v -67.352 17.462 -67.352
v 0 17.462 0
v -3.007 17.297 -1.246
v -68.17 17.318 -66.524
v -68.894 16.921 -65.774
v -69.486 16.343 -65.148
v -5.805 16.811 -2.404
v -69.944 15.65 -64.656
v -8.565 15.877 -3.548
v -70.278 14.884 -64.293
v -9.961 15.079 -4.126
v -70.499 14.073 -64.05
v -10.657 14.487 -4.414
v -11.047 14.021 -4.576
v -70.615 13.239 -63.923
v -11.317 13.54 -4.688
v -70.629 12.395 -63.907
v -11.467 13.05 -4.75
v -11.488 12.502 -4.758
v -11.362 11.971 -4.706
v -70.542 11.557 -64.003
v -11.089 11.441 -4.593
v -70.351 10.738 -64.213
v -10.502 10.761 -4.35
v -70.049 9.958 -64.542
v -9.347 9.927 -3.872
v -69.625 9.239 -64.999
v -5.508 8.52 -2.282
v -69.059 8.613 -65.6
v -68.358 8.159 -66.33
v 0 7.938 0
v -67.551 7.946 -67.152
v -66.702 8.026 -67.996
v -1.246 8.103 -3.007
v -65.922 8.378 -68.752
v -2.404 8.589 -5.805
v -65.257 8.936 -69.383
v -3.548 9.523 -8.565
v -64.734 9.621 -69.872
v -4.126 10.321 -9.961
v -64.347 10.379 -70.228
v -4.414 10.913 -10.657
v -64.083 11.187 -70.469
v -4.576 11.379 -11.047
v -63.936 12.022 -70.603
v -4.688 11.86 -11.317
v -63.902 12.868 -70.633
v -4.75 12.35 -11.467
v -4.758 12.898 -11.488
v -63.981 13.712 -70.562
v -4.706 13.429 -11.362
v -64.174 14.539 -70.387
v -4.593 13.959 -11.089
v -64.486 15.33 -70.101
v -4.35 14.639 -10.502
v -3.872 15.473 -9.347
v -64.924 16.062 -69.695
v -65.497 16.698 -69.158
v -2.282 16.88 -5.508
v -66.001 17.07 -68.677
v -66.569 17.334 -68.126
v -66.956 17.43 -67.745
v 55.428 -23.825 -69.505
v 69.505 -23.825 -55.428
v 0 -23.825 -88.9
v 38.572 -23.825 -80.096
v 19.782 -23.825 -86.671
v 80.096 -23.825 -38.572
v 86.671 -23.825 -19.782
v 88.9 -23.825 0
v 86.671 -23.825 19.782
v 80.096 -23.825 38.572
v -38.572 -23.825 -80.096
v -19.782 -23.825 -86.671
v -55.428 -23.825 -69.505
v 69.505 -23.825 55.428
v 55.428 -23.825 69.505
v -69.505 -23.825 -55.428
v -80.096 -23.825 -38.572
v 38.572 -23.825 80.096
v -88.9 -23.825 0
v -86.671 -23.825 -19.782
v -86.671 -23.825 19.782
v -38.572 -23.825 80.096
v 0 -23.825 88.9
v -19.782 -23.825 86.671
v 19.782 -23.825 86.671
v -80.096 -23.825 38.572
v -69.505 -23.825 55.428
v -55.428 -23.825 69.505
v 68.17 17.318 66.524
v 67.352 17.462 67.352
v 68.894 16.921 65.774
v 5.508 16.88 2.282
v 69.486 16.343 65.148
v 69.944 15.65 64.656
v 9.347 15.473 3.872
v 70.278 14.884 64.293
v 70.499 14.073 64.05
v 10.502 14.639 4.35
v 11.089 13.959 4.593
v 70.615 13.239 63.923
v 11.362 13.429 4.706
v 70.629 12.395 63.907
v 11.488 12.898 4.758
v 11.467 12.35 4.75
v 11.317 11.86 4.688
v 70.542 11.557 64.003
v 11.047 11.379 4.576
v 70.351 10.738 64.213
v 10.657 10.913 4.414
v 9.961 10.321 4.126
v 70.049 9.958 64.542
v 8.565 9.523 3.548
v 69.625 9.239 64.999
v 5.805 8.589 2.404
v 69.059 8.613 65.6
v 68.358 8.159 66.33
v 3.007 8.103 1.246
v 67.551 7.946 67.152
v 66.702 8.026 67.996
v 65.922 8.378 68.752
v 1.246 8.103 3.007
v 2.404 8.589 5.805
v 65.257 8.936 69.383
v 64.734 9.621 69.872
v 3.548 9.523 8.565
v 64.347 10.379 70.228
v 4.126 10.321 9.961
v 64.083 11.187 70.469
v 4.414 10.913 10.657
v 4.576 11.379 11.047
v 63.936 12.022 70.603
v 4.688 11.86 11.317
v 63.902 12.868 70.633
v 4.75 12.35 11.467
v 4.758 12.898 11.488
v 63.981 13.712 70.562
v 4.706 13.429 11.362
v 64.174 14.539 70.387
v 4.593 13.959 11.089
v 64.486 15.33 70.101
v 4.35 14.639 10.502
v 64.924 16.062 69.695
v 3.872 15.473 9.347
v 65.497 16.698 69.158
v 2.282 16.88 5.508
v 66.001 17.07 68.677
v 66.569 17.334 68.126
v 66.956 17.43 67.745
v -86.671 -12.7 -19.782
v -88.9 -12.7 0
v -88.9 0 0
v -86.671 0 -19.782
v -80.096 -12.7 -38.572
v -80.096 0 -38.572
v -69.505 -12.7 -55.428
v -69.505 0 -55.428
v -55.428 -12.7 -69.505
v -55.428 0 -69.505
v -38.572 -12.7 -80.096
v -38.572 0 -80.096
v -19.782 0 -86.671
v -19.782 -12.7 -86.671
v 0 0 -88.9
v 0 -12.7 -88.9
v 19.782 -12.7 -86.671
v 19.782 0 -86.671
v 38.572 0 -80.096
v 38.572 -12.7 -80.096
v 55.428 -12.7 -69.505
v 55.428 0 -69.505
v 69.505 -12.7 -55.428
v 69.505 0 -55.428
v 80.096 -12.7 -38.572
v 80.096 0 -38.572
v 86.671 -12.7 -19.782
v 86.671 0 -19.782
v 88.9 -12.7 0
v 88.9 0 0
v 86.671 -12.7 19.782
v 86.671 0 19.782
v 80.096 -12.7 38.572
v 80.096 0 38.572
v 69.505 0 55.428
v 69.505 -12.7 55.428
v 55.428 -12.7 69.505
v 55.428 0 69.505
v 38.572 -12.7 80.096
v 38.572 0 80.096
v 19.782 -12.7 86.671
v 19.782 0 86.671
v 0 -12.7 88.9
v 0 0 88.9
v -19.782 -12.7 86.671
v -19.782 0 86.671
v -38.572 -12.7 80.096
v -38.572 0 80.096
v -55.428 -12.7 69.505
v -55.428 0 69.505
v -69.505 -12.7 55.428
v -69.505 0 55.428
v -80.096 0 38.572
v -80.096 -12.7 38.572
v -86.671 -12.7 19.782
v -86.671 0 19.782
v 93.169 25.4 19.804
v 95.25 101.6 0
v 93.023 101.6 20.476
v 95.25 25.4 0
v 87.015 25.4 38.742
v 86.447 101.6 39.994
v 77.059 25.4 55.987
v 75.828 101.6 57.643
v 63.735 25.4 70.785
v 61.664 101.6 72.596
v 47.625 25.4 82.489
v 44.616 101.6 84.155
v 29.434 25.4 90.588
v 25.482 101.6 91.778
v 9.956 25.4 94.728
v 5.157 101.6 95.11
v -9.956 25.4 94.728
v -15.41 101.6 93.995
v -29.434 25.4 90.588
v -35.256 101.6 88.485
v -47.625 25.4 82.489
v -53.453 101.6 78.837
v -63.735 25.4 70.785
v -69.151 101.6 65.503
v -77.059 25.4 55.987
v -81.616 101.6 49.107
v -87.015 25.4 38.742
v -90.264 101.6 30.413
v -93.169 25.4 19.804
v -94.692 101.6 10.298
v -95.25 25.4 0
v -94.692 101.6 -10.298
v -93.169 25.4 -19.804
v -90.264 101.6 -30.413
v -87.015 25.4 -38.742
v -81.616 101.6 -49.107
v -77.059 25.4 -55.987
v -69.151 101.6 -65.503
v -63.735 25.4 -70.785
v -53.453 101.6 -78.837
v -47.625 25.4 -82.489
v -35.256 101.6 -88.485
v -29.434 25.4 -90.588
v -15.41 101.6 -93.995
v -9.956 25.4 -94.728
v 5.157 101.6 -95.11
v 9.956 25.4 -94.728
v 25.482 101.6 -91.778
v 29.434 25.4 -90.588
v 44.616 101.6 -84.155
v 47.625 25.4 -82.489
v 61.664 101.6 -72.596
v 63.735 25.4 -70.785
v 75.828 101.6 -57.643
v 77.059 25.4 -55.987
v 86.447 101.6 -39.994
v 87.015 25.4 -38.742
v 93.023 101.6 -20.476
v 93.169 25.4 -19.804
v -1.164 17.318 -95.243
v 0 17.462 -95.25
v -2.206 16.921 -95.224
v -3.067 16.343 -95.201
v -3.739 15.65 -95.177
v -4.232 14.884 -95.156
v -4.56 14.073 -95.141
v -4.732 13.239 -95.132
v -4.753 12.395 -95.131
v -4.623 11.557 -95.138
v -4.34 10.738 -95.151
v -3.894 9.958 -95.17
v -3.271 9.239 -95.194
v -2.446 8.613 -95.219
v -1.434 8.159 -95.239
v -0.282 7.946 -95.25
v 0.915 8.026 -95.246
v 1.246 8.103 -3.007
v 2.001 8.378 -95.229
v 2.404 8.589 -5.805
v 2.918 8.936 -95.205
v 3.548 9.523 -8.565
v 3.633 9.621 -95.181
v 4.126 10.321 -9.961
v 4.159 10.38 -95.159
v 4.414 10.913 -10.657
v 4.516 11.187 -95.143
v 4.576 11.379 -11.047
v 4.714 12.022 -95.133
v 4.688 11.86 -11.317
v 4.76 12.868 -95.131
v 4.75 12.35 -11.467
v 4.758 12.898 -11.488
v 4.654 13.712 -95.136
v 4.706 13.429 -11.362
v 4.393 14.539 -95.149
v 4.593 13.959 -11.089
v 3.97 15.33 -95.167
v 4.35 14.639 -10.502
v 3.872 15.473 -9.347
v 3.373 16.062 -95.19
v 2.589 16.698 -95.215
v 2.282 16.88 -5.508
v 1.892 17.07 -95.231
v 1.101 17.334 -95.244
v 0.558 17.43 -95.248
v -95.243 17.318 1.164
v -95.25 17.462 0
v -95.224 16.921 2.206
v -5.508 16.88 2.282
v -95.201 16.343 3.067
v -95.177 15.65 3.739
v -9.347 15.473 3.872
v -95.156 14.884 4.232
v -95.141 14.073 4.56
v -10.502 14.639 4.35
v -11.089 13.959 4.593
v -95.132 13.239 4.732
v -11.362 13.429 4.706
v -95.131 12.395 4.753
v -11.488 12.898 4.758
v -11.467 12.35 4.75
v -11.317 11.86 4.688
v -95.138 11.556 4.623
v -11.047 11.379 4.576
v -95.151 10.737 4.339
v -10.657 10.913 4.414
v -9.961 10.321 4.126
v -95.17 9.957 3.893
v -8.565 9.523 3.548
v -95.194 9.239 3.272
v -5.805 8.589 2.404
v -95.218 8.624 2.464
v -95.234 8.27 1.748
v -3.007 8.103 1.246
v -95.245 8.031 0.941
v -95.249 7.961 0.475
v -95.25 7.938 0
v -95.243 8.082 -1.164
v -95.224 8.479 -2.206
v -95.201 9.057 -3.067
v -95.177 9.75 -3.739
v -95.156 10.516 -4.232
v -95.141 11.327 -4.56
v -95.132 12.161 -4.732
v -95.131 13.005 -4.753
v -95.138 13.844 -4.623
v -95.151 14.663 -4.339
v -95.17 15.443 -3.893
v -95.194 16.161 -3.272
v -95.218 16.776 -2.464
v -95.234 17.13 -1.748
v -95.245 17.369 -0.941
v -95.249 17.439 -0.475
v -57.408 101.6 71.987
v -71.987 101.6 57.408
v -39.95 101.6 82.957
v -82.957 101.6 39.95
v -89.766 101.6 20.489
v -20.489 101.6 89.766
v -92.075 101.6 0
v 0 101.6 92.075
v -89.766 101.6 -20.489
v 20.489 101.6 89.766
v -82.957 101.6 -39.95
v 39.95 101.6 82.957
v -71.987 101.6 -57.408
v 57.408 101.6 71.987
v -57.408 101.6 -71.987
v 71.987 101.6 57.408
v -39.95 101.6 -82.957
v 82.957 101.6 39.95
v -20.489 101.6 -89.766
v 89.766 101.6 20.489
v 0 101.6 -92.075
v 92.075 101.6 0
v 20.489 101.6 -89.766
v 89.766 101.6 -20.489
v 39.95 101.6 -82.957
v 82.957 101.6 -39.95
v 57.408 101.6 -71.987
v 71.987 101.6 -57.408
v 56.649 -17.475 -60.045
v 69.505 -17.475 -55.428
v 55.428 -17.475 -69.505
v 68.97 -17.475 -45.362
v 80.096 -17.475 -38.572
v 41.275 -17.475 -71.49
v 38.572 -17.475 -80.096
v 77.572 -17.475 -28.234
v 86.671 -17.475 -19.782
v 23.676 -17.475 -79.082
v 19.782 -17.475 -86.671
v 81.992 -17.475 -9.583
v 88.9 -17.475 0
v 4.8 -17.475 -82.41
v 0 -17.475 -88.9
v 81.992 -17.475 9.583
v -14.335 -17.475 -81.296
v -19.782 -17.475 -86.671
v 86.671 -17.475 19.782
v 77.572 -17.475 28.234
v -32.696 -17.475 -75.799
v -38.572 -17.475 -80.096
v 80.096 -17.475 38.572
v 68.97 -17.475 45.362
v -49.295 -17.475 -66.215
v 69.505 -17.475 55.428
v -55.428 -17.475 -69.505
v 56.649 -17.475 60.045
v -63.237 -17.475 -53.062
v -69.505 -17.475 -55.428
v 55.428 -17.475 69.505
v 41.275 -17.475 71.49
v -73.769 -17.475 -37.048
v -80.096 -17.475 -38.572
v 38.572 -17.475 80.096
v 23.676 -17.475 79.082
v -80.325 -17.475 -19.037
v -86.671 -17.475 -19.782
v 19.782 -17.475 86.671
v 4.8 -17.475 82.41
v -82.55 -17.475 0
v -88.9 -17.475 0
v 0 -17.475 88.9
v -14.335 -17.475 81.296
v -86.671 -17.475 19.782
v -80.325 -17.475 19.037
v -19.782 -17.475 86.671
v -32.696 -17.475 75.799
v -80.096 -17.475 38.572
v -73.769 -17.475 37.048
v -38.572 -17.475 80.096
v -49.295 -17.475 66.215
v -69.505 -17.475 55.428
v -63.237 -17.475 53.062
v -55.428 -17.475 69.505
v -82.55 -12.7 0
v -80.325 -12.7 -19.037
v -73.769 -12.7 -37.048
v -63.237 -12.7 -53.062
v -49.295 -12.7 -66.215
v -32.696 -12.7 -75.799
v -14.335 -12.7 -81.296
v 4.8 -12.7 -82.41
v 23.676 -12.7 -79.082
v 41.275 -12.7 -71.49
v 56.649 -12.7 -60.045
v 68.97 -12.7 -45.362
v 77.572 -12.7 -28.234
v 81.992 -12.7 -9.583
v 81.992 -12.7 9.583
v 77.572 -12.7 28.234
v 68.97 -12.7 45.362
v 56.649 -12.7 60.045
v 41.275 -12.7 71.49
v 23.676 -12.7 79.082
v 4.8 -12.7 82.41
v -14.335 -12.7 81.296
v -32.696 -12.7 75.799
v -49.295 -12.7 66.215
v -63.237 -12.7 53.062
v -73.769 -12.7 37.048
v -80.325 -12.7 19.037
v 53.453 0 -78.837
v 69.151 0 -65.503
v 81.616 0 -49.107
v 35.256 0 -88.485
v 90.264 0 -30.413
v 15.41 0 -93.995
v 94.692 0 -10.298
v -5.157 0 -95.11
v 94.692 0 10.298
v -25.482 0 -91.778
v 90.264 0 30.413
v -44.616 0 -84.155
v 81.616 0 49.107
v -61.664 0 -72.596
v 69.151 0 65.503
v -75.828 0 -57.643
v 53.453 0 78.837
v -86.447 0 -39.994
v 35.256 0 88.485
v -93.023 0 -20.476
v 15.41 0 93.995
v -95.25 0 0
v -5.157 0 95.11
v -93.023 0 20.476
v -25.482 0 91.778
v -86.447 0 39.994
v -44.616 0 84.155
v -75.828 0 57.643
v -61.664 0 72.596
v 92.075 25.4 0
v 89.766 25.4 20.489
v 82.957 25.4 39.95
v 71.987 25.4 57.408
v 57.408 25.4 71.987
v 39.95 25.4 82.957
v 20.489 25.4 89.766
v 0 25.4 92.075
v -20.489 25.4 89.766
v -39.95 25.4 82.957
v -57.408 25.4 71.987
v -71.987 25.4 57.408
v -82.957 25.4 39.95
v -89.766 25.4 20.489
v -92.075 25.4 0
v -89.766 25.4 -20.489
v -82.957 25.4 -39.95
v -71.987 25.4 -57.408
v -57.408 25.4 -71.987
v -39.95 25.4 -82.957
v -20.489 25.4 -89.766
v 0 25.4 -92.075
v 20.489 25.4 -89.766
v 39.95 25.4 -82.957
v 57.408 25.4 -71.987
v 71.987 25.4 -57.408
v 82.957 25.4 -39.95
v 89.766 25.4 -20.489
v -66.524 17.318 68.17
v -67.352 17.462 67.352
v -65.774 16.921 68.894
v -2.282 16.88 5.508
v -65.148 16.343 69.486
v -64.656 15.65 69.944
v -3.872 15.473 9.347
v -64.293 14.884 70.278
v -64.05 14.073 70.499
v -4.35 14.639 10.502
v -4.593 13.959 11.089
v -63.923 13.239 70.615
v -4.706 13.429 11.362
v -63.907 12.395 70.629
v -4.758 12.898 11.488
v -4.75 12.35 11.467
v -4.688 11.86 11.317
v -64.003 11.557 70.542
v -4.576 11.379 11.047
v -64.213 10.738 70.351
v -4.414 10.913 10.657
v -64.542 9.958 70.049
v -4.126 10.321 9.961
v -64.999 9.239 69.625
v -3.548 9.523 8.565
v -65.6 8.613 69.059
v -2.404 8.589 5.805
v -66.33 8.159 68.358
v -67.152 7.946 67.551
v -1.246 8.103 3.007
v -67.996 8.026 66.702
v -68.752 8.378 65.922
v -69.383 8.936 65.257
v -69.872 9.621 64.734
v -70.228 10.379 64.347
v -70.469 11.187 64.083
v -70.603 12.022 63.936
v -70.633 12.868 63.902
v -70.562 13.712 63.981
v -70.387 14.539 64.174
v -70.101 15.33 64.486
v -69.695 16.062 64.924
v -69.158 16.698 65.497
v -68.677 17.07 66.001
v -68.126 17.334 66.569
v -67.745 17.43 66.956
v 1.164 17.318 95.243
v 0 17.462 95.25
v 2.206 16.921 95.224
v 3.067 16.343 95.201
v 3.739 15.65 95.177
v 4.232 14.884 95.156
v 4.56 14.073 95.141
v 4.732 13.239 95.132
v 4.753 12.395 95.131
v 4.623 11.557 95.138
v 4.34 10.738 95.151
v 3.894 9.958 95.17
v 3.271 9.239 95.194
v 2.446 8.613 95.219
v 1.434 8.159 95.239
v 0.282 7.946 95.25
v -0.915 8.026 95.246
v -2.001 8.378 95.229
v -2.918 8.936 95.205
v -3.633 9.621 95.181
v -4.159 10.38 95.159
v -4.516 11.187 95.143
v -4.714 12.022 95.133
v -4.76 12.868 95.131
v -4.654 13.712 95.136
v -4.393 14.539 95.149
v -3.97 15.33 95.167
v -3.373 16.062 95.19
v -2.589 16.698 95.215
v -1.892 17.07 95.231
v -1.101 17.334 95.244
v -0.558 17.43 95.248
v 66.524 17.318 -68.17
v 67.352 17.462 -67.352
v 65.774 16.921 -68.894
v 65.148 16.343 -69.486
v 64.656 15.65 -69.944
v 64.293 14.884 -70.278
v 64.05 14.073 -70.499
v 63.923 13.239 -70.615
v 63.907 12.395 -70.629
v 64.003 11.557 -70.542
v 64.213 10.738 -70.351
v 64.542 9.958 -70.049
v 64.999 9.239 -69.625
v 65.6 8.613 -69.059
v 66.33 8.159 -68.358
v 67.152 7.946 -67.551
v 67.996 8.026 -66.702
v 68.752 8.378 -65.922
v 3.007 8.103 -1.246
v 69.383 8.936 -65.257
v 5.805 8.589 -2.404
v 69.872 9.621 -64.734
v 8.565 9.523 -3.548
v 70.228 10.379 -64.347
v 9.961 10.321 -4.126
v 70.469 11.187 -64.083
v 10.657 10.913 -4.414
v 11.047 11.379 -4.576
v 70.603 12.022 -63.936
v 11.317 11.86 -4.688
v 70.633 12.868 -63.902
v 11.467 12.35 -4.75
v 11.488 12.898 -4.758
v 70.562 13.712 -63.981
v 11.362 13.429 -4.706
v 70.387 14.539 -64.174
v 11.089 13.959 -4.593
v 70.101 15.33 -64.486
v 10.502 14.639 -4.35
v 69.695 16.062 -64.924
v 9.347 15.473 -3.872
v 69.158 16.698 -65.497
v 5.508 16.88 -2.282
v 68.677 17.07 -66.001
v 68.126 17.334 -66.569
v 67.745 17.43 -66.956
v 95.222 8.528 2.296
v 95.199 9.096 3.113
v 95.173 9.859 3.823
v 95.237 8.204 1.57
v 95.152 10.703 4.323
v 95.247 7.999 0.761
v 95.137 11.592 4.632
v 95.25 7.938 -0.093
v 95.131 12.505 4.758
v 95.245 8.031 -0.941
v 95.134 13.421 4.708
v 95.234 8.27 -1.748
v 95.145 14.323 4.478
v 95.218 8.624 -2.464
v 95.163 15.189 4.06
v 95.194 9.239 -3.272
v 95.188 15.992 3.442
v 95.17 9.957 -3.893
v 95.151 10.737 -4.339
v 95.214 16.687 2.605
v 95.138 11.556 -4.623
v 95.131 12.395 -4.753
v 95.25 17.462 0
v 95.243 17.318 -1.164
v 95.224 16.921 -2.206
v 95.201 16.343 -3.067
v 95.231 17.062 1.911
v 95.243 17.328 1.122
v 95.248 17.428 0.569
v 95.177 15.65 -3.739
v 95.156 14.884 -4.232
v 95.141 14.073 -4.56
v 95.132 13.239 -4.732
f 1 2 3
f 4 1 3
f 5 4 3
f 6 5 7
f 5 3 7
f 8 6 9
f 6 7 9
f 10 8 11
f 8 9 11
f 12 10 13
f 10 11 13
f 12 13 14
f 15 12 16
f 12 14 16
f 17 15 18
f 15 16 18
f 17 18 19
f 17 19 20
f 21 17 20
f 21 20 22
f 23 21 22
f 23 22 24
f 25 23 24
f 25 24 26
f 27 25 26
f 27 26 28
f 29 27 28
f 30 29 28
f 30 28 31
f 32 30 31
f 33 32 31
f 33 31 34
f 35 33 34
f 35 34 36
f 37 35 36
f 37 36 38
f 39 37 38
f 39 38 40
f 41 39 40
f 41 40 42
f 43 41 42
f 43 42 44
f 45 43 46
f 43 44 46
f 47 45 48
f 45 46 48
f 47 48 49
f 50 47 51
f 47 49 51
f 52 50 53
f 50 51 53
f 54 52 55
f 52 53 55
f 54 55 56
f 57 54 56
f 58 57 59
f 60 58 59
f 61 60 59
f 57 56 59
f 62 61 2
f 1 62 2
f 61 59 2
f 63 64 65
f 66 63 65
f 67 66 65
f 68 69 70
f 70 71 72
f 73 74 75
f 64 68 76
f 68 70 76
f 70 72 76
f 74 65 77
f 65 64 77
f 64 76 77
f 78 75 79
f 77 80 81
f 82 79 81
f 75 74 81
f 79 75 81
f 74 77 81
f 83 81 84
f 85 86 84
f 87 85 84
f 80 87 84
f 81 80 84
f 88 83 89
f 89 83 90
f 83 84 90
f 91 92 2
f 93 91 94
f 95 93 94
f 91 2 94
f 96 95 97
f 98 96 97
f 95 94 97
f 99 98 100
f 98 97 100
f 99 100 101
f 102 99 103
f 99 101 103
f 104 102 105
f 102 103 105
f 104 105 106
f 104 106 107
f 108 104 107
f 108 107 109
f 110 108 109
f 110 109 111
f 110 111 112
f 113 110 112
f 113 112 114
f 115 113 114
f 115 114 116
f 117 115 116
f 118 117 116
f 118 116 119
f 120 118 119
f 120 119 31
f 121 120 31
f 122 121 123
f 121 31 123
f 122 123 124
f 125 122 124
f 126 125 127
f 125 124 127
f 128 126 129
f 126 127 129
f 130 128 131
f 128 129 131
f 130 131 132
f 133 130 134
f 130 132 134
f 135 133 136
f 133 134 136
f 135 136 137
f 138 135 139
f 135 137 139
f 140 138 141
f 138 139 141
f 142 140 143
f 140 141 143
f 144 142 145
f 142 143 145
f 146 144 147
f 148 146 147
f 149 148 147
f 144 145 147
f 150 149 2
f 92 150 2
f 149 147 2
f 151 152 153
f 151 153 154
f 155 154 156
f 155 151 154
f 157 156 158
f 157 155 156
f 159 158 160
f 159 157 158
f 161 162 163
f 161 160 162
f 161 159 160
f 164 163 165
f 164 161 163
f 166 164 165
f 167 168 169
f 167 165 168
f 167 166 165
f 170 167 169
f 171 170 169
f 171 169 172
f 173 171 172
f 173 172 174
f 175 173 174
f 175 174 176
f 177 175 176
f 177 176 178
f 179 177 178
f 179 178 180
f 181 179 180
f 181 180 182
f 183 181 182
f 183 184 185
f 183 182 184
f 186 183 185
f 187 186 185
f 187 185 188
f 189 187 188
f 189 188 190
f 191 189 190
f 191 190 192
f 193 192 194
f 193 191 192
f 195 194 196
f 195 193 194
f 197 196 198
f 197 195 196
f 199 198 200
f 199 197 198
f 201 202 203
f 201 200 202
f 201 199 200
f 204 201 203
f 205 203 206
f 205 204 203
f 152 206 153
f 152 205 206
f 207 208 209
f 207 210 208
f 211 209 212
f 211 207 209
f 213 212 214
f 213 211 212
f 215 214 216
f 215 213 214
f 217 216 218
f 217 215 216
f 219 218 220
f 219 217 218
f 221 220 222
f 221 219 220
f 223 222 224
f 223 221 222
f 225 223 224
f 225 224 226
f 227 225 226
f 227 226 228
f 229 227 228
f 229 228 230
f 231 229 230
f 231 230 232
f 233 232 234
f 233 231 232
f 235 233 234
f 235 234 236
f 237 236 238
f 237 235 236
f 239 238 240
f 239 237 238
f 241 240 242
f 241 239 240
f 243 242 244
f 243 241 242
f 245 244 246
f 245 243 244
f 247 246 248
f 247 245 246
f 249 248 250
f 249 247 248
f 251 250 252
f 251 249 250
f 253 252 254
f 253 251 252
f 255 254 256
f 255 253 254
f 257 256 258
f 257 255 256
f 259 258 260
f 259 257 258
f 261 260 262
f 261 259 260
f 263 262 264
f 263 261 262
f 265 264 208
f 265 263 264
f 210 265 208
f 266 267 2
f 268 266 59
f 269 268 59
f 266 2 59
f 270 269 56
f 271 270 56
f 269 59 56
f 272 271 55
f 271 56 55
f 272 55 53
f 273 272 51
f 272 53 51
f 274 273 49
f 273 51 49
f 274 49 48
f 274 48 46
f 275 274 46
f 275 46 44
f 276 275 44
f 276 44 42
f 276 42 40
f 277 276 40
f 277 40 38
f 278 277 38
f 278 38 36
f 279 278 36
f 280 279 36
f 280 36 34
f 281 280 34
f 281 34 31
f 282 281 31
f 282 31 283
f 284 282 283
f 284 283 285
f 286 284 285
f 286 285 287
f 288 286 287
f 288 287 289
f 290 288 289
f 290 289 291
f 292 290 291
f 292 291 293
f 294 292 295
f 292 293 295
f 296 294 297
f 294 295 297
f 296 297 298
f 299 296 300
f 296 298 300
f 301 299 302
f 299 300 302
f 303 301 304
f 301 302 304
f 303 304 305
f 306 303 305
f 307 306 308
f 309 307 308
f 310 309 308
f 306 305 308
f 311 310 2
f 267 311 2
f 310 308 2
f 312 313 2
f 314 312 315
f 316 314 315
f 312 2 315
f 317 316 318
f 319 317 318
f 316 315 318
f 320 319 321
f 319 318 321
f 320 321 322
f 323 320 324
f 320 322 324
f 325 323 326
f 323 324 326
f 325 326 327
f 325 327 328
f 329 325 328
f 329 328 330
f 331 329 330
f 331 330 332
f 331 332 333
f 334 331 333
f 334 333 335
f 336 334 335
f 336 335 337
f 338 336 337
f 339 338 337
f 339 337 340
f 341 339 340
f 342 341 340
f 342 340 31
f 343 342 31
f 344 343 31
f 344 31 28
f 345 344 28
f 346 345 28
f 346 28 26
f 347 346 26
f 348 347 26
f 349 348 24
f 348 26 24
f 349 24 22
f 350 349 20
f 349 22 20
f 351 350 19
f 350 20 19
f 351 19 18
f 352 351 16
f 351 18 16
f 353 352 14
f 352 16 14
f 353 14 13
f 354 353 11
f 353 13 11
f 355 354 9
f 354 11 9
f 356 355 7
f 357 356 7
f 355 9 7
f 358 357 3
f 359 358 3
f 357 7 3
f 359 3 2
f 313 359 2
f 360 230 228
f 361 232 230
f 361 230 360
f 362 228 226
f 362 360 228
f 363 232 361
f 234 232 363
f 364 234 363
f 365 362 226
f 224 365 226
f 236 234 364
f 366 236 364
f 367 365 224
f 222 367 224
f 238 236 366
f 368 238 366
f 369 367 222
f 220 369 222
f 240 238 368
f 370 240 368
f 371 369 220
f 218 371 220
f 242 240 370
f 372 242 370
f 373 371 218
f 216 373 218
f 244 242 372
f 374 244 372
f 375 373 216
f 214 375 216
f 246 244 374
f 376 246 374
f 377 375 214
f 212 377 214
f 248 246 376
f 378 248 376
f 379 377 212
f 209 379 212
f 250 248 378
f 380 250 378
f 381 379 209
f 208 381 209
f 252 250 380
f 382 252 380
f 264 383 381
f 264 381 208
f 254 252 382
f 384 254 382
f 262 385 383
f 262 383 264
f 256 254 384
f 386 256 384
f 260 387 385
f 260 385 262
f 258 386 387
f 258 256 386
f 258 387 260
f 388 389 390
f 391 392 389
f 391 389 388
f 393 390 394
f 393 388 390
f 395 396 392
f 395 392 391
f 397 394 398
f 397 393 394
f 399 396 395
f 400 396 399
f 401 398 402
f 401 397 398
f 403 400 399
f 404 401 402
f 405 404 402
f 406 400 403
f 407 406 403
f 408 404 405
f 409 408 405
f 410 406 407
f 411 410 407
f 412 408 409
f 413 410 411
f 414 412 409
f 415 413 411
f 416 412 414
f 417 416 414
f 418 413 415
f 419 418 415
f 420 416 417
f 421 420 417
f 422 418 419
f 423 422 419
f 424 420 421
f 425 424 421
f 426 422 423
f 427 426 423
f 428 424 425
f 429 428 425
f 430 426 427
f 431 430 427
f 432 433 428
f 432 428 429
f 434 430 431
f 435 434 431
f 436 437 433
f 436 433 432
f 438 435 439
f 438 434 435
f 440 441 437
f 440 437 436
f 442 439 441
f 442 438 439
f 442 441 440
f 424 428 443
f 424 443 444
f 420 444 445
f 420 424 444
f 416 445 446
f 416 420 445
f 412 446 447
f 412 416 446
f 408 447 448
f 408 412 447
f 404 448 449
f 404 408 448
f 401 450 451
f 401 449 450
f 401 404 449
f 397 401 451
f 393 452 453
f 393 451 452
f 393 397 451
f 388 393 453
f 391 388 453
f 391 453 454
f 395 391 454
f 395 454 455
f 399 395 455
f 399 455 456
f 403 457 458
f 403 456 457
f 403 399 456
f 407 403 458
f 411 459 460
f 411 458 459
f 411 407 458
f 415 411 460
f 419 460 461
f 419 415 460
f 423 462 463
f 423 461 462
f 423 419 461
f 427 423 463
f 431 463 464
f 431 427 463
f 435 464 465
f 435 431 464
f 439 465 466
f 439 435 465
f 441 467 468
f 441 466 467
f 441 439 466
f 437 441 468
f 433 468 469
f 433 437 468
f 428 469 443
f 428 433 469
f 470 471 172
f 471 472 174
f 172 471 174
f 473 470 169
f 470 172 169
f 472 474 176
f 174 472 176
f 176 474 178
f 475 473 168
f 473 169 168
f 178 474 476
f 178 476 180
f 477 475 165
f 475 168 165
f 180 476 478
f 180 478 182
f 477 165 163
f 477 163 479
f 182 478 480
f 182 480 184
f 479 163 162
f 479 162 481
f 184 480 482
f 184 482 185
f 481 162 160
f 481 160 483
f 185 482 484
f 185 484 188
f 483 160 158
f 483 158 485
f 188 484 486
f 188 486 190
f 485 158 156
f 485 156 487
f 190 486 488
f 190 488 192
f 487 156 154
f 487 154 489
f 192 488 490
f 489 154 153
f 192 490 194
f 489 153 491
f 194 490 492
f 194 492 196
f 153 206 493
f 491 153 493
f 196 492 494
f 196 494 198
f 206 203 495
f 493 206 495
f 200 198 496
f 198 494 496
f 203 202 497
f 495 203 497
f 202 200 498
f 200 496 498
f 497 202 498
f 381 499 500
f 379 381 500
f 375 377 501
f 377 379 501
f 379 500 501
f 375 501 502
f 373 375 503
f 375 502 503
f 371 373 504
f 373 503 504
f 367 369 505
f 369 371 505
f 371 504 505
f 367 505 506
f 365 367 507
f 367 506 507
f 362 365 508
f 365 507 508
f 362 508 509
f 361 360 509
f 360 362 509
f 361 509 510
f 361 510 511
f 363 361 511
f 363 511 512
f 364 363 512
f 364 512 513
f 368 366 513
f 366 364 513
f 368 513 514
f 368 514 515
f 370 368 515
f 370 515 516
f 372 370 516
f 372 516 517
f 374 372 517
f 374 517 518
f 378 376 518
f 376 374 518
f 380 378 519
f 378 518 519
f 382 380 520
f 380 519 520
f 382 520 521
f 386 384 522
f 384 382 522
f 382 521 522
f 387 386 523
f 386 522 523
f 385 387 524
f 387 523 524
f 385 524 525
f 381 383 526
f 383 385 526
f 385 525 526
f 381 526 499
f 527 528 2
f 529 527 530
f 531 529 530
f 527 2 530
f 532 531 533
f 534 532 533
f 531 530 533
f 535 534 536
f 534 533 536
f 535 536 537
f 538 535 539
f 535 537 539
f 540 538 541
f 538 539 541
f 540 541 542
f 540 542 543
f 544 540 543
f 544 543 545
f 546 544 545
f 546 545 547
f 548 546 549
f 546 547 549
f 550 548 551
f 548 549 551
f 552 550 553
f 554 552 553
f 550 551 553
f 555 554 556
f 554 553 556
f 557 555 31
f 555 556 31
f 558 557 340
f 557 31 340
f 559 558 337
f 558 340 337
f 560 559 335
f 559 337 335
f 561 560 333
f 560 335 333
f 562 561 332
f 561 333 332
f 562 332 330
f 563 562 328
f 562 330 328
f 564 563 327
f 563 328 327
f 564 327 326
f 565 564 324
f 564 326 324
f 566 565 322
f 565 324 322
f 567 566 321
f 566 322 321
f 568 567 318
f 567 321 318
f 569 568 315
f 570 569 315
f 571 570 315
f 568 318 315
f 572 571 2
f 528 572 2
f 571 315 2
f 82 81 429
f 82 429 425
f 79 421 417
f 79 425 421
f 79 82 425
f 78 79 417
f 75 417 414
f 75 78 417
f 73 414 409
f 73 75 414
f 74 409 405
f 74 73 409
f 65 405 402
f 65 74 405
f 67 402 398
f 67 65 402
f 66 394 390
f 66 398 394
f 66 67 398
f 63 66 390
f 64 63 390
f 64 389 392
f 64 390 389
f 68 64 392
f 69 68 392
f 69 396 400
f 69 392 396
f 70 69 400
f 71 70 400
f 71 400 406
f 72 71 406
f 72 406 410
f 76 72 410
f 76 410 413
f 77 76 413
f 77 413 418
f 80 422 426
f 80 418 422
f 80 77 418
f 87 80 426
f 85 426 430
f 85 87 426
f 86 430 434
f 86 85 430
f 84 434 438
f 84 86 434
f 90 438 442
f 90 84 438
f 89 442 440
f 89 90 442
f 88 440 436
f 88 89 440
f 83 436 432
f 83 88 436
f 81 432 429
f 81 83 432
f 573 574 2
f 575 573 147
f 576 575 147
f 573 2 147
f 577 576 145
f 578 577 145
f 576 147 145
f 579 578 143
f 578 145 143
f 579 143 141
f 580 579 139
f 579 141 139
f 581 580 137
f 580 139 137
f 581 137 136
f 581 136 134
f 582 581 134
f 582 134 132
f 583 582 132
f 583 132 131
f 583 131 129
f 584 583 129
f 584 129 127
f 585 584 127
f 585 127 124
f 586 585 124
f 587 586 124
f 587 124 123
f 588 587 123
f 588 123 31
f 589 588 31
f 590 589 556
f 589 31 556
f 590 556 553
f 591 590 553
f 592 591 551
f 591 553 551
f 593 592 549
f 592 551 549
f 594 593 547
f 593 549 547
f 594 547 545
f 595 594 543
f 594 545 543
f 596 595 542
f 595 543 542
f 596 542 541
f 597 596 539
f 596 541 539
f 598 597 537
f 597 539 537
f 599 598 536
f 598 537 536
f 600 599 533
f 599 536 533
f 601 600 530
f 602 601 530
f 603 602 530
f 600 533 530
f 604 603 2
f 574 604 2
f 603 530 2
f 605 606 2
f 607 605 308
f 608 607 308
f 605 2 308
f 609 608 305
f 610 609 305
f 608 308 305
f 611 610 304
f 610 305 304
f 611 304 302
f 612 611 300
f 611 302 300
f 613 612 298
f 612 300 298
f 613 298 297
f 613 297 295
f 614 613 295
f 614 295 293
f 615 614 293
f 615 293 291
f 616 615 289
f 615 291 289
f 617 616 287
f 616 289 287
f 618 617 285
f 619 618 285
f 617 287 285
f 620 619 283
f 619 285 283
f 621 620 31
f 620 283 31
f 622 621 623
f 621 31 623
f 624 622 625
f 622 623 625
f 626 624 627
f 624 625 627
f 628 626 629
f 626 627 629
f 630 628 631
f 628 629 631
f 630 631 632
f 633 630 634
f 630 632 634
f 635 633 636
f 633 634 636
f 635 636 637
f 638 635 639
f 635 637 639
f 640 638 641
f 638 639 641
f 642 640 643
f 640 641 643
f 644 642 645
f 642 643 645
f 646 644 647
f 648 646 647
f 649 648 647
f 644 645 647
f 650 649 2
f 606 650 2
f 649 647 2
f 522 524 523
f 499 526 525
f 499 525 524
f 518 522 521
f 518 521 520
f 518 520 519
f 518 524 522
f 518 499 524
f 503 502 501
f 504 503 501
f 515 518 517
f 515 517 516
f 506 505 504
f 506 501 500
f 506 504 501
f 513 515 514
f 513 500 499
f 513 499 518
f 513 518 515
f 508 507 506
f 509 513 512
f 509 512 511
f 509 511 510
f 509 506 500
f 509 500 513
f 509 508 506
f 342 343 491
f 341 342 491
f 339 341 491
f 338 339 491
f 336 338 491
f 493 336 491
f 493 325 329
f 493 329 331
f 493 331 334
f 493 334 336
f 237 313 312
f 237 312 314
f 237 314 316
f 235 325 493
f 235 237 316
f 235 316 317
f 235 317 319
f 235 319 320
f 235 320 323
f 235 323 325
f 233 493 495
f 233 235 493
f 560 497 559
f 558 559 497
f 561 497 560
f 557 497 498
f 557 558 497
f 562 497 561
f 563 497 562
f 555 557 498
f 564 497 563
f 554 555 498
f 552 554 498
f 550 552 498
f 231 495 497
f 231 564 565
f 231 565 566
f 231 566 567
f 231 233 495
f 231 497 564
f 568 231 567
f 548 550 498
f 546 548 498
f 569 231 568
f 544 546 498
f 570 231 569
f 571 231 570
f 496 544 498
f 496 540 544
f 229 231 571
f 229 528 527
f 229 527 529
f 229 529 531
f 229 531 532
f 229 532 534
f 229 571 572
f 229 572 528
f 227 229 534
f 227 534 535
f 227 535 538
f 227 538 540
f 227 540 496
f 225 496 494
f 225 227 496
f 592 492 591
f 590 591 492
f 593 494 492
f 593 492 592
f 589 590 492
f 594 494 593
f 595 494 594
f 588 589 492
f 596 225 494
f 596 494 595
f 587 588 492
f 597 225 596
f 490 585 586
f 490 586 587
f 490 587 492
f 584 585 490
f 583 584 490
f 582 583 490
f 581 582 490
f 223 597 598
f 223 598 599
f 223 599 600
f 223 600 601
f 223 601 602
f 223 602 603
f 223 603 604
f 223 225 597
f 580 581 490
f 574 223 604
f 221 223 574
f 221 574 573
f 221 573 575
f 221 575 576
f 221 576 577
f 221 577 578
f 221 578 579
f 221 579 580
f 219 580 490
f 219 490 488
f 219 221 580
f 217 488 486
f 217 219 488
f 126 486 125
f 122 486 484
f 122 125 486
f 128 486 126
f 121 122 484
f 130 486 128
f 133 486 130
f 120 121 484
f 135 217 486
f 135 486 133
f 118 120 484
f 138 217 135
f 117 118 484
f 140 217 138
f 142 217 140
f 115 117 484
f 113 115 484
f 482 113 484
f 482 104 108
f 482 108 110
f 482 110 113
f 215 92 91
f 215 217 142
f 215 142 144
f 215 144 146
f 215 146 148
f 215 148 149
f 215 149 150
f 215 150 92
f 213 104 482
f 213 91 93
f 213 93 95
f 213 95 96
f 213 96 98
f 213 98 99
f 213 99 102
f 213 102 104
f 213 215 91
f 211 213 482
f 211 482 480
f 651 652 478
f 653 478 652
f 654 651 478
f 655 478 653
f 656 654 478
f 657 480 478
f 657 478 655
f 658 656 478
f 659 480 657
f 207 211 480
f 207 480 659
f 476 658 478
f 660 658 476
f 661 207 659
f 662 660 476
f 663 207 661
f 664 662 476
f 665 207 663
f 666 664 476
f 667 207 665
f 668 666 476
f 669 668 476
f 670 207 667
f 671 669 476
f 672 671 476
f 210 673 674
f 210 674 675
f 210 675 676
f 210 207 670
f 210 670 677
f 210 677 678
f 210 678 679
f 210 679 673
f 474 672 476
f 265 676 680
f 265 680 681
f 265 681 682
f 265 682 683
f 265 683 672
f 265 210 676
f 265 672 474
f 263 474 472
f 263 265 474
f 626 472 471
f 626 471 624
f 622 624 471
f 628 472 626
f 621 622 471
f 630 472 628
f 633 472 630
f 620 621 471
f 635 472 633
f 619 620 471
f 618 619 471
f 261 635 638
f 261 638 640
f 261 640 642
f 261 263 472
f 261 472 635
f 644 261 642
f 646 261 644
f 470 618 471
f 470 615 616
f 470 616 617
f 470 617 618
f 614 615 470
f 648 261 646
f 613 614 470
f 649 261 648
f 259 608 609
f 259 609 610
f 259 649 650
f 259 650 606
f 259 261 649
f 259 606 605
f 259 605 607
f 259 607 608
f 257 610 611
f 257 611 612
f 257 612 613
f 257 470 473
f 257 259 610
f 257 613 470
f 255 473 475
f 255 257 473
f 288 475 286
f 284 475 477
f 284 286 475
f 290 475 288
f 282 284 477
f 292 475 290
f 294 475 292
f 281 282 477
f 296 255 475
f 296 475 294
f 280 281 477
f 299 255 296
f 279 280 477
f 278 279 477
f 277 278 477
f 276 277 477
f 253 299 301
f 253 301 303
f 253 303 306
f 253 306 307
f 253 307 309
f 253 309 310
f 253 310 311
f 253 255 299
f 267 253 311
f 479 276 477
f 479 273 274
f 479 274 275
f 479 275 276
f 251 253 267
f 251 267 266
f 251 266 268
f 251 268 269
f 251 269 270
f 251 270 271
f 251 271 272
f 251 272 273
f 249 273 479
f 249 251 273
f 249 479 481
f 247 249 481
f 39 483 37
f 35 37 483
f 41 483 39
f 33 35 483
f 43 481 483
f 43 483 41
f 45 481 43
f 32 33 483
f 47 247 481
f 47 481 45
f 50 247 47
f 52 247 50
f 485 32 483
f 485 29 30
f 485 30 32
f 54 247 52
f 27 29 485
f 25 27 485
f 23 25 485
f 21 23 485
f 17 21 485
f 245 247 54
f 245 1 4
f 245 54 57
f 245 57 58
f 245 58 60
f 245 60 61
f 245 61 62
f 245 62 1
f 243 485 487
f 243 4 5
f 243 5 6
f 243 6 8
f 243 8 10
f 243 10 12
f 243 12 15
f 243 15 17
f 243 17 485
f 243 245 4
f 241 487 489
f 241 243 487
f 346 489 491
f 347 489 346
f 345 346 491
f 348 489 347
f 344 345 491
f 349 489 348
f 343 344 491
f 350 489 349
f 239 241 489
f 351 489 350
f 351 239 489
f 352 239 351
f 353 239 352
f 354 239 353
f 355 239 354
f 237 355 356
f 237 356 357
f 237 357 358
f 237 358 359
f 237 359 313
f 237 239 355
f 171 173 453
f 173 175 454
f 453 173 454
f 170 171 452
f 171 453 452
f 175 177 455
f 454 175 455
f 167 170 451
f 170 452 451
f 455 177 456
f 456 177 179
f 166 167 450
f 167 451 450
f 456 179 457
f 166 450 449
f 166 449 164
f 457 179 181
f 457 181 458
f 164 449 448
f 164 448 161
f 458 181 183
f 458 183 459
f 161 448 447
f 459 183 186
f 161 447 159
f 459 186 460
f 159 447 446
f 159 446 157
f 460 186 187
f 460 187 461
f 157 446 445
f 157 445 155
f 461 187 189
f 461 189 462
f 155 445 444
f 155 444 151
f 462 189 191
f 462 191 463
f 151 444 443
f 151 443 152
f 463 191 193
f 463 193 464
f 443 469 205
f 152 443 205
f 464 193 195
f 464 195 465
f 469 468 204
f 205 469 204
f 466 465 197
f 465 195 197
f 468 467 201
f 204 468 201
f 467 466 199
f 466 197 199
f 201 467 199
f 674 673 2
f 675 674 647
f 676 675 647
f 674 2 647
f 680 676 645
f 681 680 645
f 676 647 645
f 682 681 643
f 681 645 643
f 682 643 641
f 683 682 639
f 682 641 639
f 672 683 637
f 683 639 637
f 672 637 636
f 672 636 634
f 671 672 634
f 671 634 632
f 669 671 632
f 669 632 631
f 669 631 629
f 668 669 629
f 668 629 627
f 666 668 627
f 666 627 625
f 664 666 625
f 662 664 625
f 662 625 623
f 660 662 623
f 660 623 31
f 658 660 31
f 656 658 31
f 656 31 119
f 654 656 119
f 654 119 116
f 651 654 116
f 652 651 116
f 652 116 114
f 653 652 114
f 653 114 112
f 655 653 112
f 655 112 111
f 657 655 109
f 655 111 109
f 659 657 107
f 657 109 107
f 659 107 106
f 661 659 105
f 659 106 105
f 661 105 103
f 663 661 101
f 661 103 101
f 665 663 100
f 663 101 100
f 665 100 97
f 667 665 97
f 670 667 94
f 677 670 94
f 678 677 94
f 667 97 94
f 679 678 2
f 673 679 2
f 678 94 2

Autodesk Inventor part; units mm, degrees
ref_plane "YZ Plane" through (0, 0, 0) normal (1, 0, 0) x (0, 1, 0)
ref_plane "XZ Plane" through (0, 0, 0) normal (0, 1, 0) x (-1, 0, 0)
ref_plane "XY Plane" through (0, 0, 0) normal (0, 0, 1) x (1, 0, 0)
sketch "Sketch1" plane through (0, 0, 0) normal (0, 0, 1) x (1, 0, 0)
  line L0 (0, 0) -> (-88.9, 0)
  line L1 (-88.9, 0) -> (-88.9, -12.7)
  line L2 (-88.9, -12.7) -> (-82.55, -12.7)
  line L3 (-82.55, -12.7) -> (-82.55, -17.4752)
  line L4 (-82.55, -17.4752) -> (-88.9, -17.4752)
  line L5 (-88.9, -17.4752) -> (-88.9, -23.8252)
  line L6 (-88.9, -23.8252) -> (0, -23.8252)
  line L7 (0, 0) -> (0, 146.0976) construction
  line L8 (-88.9, 0) -> (-95.25, 0)
  line L9 (-95.25, 0) -> (-95.25, 25.4)
  line L10 (-95.25, 25.4) -> (0, 25.4)
  line L11 (0, 25.4) -> (0, -23.8252)
  dimension "d1" = 4.7752
  dimension "d2" = 88.9
  dimension "d3" = 0
  dimension "d5" = 95.25
  dimension "d6" = 6.35
  dimension "d7" = 12.7
  dimension "d8" = 25.4
  dimension "d13" = 6.35
  dimension "d21" = 6.35
revolve "Revolution1" add sketch "Sketch1" angle 360 about axis through (0, 0, 0) along (0, 1, 0)
sketch "Sketch2" plane through (0, 25.4, 0) normal (0, 1, 0) x (1, 0, 0)
  circle A0 centre (0, 0) radius 95.25
  circle A1 centre (0, 0) radius 92.075
  dimension "d9" = 190.5
  dimension "d10" = 184.15
extrude "Extrusion1" add sketch "Sketch2" along normal blind 76.2
sketch "Sketch3" plane through (0, 0, 0) normal (1, 0, 0) x (0, 1, 0)
  circle A0 centre (12.7, 0) radius 4.7625
  line L0 (0, -88.9) -> (0, 88.9) projected
  point P0 (0, 0)
  dimension "d14" = 12.7
  dimension "d15" = 9.525
extrude "Extrusion2" cut sketch "Sketch3" against normal blind 127
pattern_circular "Circular Pattern1" count 8 over 360 about axis through (0, -10, 0) along (0, 1, 0) of "Extrusion2"
properties part number "ForwardBulkHead"
